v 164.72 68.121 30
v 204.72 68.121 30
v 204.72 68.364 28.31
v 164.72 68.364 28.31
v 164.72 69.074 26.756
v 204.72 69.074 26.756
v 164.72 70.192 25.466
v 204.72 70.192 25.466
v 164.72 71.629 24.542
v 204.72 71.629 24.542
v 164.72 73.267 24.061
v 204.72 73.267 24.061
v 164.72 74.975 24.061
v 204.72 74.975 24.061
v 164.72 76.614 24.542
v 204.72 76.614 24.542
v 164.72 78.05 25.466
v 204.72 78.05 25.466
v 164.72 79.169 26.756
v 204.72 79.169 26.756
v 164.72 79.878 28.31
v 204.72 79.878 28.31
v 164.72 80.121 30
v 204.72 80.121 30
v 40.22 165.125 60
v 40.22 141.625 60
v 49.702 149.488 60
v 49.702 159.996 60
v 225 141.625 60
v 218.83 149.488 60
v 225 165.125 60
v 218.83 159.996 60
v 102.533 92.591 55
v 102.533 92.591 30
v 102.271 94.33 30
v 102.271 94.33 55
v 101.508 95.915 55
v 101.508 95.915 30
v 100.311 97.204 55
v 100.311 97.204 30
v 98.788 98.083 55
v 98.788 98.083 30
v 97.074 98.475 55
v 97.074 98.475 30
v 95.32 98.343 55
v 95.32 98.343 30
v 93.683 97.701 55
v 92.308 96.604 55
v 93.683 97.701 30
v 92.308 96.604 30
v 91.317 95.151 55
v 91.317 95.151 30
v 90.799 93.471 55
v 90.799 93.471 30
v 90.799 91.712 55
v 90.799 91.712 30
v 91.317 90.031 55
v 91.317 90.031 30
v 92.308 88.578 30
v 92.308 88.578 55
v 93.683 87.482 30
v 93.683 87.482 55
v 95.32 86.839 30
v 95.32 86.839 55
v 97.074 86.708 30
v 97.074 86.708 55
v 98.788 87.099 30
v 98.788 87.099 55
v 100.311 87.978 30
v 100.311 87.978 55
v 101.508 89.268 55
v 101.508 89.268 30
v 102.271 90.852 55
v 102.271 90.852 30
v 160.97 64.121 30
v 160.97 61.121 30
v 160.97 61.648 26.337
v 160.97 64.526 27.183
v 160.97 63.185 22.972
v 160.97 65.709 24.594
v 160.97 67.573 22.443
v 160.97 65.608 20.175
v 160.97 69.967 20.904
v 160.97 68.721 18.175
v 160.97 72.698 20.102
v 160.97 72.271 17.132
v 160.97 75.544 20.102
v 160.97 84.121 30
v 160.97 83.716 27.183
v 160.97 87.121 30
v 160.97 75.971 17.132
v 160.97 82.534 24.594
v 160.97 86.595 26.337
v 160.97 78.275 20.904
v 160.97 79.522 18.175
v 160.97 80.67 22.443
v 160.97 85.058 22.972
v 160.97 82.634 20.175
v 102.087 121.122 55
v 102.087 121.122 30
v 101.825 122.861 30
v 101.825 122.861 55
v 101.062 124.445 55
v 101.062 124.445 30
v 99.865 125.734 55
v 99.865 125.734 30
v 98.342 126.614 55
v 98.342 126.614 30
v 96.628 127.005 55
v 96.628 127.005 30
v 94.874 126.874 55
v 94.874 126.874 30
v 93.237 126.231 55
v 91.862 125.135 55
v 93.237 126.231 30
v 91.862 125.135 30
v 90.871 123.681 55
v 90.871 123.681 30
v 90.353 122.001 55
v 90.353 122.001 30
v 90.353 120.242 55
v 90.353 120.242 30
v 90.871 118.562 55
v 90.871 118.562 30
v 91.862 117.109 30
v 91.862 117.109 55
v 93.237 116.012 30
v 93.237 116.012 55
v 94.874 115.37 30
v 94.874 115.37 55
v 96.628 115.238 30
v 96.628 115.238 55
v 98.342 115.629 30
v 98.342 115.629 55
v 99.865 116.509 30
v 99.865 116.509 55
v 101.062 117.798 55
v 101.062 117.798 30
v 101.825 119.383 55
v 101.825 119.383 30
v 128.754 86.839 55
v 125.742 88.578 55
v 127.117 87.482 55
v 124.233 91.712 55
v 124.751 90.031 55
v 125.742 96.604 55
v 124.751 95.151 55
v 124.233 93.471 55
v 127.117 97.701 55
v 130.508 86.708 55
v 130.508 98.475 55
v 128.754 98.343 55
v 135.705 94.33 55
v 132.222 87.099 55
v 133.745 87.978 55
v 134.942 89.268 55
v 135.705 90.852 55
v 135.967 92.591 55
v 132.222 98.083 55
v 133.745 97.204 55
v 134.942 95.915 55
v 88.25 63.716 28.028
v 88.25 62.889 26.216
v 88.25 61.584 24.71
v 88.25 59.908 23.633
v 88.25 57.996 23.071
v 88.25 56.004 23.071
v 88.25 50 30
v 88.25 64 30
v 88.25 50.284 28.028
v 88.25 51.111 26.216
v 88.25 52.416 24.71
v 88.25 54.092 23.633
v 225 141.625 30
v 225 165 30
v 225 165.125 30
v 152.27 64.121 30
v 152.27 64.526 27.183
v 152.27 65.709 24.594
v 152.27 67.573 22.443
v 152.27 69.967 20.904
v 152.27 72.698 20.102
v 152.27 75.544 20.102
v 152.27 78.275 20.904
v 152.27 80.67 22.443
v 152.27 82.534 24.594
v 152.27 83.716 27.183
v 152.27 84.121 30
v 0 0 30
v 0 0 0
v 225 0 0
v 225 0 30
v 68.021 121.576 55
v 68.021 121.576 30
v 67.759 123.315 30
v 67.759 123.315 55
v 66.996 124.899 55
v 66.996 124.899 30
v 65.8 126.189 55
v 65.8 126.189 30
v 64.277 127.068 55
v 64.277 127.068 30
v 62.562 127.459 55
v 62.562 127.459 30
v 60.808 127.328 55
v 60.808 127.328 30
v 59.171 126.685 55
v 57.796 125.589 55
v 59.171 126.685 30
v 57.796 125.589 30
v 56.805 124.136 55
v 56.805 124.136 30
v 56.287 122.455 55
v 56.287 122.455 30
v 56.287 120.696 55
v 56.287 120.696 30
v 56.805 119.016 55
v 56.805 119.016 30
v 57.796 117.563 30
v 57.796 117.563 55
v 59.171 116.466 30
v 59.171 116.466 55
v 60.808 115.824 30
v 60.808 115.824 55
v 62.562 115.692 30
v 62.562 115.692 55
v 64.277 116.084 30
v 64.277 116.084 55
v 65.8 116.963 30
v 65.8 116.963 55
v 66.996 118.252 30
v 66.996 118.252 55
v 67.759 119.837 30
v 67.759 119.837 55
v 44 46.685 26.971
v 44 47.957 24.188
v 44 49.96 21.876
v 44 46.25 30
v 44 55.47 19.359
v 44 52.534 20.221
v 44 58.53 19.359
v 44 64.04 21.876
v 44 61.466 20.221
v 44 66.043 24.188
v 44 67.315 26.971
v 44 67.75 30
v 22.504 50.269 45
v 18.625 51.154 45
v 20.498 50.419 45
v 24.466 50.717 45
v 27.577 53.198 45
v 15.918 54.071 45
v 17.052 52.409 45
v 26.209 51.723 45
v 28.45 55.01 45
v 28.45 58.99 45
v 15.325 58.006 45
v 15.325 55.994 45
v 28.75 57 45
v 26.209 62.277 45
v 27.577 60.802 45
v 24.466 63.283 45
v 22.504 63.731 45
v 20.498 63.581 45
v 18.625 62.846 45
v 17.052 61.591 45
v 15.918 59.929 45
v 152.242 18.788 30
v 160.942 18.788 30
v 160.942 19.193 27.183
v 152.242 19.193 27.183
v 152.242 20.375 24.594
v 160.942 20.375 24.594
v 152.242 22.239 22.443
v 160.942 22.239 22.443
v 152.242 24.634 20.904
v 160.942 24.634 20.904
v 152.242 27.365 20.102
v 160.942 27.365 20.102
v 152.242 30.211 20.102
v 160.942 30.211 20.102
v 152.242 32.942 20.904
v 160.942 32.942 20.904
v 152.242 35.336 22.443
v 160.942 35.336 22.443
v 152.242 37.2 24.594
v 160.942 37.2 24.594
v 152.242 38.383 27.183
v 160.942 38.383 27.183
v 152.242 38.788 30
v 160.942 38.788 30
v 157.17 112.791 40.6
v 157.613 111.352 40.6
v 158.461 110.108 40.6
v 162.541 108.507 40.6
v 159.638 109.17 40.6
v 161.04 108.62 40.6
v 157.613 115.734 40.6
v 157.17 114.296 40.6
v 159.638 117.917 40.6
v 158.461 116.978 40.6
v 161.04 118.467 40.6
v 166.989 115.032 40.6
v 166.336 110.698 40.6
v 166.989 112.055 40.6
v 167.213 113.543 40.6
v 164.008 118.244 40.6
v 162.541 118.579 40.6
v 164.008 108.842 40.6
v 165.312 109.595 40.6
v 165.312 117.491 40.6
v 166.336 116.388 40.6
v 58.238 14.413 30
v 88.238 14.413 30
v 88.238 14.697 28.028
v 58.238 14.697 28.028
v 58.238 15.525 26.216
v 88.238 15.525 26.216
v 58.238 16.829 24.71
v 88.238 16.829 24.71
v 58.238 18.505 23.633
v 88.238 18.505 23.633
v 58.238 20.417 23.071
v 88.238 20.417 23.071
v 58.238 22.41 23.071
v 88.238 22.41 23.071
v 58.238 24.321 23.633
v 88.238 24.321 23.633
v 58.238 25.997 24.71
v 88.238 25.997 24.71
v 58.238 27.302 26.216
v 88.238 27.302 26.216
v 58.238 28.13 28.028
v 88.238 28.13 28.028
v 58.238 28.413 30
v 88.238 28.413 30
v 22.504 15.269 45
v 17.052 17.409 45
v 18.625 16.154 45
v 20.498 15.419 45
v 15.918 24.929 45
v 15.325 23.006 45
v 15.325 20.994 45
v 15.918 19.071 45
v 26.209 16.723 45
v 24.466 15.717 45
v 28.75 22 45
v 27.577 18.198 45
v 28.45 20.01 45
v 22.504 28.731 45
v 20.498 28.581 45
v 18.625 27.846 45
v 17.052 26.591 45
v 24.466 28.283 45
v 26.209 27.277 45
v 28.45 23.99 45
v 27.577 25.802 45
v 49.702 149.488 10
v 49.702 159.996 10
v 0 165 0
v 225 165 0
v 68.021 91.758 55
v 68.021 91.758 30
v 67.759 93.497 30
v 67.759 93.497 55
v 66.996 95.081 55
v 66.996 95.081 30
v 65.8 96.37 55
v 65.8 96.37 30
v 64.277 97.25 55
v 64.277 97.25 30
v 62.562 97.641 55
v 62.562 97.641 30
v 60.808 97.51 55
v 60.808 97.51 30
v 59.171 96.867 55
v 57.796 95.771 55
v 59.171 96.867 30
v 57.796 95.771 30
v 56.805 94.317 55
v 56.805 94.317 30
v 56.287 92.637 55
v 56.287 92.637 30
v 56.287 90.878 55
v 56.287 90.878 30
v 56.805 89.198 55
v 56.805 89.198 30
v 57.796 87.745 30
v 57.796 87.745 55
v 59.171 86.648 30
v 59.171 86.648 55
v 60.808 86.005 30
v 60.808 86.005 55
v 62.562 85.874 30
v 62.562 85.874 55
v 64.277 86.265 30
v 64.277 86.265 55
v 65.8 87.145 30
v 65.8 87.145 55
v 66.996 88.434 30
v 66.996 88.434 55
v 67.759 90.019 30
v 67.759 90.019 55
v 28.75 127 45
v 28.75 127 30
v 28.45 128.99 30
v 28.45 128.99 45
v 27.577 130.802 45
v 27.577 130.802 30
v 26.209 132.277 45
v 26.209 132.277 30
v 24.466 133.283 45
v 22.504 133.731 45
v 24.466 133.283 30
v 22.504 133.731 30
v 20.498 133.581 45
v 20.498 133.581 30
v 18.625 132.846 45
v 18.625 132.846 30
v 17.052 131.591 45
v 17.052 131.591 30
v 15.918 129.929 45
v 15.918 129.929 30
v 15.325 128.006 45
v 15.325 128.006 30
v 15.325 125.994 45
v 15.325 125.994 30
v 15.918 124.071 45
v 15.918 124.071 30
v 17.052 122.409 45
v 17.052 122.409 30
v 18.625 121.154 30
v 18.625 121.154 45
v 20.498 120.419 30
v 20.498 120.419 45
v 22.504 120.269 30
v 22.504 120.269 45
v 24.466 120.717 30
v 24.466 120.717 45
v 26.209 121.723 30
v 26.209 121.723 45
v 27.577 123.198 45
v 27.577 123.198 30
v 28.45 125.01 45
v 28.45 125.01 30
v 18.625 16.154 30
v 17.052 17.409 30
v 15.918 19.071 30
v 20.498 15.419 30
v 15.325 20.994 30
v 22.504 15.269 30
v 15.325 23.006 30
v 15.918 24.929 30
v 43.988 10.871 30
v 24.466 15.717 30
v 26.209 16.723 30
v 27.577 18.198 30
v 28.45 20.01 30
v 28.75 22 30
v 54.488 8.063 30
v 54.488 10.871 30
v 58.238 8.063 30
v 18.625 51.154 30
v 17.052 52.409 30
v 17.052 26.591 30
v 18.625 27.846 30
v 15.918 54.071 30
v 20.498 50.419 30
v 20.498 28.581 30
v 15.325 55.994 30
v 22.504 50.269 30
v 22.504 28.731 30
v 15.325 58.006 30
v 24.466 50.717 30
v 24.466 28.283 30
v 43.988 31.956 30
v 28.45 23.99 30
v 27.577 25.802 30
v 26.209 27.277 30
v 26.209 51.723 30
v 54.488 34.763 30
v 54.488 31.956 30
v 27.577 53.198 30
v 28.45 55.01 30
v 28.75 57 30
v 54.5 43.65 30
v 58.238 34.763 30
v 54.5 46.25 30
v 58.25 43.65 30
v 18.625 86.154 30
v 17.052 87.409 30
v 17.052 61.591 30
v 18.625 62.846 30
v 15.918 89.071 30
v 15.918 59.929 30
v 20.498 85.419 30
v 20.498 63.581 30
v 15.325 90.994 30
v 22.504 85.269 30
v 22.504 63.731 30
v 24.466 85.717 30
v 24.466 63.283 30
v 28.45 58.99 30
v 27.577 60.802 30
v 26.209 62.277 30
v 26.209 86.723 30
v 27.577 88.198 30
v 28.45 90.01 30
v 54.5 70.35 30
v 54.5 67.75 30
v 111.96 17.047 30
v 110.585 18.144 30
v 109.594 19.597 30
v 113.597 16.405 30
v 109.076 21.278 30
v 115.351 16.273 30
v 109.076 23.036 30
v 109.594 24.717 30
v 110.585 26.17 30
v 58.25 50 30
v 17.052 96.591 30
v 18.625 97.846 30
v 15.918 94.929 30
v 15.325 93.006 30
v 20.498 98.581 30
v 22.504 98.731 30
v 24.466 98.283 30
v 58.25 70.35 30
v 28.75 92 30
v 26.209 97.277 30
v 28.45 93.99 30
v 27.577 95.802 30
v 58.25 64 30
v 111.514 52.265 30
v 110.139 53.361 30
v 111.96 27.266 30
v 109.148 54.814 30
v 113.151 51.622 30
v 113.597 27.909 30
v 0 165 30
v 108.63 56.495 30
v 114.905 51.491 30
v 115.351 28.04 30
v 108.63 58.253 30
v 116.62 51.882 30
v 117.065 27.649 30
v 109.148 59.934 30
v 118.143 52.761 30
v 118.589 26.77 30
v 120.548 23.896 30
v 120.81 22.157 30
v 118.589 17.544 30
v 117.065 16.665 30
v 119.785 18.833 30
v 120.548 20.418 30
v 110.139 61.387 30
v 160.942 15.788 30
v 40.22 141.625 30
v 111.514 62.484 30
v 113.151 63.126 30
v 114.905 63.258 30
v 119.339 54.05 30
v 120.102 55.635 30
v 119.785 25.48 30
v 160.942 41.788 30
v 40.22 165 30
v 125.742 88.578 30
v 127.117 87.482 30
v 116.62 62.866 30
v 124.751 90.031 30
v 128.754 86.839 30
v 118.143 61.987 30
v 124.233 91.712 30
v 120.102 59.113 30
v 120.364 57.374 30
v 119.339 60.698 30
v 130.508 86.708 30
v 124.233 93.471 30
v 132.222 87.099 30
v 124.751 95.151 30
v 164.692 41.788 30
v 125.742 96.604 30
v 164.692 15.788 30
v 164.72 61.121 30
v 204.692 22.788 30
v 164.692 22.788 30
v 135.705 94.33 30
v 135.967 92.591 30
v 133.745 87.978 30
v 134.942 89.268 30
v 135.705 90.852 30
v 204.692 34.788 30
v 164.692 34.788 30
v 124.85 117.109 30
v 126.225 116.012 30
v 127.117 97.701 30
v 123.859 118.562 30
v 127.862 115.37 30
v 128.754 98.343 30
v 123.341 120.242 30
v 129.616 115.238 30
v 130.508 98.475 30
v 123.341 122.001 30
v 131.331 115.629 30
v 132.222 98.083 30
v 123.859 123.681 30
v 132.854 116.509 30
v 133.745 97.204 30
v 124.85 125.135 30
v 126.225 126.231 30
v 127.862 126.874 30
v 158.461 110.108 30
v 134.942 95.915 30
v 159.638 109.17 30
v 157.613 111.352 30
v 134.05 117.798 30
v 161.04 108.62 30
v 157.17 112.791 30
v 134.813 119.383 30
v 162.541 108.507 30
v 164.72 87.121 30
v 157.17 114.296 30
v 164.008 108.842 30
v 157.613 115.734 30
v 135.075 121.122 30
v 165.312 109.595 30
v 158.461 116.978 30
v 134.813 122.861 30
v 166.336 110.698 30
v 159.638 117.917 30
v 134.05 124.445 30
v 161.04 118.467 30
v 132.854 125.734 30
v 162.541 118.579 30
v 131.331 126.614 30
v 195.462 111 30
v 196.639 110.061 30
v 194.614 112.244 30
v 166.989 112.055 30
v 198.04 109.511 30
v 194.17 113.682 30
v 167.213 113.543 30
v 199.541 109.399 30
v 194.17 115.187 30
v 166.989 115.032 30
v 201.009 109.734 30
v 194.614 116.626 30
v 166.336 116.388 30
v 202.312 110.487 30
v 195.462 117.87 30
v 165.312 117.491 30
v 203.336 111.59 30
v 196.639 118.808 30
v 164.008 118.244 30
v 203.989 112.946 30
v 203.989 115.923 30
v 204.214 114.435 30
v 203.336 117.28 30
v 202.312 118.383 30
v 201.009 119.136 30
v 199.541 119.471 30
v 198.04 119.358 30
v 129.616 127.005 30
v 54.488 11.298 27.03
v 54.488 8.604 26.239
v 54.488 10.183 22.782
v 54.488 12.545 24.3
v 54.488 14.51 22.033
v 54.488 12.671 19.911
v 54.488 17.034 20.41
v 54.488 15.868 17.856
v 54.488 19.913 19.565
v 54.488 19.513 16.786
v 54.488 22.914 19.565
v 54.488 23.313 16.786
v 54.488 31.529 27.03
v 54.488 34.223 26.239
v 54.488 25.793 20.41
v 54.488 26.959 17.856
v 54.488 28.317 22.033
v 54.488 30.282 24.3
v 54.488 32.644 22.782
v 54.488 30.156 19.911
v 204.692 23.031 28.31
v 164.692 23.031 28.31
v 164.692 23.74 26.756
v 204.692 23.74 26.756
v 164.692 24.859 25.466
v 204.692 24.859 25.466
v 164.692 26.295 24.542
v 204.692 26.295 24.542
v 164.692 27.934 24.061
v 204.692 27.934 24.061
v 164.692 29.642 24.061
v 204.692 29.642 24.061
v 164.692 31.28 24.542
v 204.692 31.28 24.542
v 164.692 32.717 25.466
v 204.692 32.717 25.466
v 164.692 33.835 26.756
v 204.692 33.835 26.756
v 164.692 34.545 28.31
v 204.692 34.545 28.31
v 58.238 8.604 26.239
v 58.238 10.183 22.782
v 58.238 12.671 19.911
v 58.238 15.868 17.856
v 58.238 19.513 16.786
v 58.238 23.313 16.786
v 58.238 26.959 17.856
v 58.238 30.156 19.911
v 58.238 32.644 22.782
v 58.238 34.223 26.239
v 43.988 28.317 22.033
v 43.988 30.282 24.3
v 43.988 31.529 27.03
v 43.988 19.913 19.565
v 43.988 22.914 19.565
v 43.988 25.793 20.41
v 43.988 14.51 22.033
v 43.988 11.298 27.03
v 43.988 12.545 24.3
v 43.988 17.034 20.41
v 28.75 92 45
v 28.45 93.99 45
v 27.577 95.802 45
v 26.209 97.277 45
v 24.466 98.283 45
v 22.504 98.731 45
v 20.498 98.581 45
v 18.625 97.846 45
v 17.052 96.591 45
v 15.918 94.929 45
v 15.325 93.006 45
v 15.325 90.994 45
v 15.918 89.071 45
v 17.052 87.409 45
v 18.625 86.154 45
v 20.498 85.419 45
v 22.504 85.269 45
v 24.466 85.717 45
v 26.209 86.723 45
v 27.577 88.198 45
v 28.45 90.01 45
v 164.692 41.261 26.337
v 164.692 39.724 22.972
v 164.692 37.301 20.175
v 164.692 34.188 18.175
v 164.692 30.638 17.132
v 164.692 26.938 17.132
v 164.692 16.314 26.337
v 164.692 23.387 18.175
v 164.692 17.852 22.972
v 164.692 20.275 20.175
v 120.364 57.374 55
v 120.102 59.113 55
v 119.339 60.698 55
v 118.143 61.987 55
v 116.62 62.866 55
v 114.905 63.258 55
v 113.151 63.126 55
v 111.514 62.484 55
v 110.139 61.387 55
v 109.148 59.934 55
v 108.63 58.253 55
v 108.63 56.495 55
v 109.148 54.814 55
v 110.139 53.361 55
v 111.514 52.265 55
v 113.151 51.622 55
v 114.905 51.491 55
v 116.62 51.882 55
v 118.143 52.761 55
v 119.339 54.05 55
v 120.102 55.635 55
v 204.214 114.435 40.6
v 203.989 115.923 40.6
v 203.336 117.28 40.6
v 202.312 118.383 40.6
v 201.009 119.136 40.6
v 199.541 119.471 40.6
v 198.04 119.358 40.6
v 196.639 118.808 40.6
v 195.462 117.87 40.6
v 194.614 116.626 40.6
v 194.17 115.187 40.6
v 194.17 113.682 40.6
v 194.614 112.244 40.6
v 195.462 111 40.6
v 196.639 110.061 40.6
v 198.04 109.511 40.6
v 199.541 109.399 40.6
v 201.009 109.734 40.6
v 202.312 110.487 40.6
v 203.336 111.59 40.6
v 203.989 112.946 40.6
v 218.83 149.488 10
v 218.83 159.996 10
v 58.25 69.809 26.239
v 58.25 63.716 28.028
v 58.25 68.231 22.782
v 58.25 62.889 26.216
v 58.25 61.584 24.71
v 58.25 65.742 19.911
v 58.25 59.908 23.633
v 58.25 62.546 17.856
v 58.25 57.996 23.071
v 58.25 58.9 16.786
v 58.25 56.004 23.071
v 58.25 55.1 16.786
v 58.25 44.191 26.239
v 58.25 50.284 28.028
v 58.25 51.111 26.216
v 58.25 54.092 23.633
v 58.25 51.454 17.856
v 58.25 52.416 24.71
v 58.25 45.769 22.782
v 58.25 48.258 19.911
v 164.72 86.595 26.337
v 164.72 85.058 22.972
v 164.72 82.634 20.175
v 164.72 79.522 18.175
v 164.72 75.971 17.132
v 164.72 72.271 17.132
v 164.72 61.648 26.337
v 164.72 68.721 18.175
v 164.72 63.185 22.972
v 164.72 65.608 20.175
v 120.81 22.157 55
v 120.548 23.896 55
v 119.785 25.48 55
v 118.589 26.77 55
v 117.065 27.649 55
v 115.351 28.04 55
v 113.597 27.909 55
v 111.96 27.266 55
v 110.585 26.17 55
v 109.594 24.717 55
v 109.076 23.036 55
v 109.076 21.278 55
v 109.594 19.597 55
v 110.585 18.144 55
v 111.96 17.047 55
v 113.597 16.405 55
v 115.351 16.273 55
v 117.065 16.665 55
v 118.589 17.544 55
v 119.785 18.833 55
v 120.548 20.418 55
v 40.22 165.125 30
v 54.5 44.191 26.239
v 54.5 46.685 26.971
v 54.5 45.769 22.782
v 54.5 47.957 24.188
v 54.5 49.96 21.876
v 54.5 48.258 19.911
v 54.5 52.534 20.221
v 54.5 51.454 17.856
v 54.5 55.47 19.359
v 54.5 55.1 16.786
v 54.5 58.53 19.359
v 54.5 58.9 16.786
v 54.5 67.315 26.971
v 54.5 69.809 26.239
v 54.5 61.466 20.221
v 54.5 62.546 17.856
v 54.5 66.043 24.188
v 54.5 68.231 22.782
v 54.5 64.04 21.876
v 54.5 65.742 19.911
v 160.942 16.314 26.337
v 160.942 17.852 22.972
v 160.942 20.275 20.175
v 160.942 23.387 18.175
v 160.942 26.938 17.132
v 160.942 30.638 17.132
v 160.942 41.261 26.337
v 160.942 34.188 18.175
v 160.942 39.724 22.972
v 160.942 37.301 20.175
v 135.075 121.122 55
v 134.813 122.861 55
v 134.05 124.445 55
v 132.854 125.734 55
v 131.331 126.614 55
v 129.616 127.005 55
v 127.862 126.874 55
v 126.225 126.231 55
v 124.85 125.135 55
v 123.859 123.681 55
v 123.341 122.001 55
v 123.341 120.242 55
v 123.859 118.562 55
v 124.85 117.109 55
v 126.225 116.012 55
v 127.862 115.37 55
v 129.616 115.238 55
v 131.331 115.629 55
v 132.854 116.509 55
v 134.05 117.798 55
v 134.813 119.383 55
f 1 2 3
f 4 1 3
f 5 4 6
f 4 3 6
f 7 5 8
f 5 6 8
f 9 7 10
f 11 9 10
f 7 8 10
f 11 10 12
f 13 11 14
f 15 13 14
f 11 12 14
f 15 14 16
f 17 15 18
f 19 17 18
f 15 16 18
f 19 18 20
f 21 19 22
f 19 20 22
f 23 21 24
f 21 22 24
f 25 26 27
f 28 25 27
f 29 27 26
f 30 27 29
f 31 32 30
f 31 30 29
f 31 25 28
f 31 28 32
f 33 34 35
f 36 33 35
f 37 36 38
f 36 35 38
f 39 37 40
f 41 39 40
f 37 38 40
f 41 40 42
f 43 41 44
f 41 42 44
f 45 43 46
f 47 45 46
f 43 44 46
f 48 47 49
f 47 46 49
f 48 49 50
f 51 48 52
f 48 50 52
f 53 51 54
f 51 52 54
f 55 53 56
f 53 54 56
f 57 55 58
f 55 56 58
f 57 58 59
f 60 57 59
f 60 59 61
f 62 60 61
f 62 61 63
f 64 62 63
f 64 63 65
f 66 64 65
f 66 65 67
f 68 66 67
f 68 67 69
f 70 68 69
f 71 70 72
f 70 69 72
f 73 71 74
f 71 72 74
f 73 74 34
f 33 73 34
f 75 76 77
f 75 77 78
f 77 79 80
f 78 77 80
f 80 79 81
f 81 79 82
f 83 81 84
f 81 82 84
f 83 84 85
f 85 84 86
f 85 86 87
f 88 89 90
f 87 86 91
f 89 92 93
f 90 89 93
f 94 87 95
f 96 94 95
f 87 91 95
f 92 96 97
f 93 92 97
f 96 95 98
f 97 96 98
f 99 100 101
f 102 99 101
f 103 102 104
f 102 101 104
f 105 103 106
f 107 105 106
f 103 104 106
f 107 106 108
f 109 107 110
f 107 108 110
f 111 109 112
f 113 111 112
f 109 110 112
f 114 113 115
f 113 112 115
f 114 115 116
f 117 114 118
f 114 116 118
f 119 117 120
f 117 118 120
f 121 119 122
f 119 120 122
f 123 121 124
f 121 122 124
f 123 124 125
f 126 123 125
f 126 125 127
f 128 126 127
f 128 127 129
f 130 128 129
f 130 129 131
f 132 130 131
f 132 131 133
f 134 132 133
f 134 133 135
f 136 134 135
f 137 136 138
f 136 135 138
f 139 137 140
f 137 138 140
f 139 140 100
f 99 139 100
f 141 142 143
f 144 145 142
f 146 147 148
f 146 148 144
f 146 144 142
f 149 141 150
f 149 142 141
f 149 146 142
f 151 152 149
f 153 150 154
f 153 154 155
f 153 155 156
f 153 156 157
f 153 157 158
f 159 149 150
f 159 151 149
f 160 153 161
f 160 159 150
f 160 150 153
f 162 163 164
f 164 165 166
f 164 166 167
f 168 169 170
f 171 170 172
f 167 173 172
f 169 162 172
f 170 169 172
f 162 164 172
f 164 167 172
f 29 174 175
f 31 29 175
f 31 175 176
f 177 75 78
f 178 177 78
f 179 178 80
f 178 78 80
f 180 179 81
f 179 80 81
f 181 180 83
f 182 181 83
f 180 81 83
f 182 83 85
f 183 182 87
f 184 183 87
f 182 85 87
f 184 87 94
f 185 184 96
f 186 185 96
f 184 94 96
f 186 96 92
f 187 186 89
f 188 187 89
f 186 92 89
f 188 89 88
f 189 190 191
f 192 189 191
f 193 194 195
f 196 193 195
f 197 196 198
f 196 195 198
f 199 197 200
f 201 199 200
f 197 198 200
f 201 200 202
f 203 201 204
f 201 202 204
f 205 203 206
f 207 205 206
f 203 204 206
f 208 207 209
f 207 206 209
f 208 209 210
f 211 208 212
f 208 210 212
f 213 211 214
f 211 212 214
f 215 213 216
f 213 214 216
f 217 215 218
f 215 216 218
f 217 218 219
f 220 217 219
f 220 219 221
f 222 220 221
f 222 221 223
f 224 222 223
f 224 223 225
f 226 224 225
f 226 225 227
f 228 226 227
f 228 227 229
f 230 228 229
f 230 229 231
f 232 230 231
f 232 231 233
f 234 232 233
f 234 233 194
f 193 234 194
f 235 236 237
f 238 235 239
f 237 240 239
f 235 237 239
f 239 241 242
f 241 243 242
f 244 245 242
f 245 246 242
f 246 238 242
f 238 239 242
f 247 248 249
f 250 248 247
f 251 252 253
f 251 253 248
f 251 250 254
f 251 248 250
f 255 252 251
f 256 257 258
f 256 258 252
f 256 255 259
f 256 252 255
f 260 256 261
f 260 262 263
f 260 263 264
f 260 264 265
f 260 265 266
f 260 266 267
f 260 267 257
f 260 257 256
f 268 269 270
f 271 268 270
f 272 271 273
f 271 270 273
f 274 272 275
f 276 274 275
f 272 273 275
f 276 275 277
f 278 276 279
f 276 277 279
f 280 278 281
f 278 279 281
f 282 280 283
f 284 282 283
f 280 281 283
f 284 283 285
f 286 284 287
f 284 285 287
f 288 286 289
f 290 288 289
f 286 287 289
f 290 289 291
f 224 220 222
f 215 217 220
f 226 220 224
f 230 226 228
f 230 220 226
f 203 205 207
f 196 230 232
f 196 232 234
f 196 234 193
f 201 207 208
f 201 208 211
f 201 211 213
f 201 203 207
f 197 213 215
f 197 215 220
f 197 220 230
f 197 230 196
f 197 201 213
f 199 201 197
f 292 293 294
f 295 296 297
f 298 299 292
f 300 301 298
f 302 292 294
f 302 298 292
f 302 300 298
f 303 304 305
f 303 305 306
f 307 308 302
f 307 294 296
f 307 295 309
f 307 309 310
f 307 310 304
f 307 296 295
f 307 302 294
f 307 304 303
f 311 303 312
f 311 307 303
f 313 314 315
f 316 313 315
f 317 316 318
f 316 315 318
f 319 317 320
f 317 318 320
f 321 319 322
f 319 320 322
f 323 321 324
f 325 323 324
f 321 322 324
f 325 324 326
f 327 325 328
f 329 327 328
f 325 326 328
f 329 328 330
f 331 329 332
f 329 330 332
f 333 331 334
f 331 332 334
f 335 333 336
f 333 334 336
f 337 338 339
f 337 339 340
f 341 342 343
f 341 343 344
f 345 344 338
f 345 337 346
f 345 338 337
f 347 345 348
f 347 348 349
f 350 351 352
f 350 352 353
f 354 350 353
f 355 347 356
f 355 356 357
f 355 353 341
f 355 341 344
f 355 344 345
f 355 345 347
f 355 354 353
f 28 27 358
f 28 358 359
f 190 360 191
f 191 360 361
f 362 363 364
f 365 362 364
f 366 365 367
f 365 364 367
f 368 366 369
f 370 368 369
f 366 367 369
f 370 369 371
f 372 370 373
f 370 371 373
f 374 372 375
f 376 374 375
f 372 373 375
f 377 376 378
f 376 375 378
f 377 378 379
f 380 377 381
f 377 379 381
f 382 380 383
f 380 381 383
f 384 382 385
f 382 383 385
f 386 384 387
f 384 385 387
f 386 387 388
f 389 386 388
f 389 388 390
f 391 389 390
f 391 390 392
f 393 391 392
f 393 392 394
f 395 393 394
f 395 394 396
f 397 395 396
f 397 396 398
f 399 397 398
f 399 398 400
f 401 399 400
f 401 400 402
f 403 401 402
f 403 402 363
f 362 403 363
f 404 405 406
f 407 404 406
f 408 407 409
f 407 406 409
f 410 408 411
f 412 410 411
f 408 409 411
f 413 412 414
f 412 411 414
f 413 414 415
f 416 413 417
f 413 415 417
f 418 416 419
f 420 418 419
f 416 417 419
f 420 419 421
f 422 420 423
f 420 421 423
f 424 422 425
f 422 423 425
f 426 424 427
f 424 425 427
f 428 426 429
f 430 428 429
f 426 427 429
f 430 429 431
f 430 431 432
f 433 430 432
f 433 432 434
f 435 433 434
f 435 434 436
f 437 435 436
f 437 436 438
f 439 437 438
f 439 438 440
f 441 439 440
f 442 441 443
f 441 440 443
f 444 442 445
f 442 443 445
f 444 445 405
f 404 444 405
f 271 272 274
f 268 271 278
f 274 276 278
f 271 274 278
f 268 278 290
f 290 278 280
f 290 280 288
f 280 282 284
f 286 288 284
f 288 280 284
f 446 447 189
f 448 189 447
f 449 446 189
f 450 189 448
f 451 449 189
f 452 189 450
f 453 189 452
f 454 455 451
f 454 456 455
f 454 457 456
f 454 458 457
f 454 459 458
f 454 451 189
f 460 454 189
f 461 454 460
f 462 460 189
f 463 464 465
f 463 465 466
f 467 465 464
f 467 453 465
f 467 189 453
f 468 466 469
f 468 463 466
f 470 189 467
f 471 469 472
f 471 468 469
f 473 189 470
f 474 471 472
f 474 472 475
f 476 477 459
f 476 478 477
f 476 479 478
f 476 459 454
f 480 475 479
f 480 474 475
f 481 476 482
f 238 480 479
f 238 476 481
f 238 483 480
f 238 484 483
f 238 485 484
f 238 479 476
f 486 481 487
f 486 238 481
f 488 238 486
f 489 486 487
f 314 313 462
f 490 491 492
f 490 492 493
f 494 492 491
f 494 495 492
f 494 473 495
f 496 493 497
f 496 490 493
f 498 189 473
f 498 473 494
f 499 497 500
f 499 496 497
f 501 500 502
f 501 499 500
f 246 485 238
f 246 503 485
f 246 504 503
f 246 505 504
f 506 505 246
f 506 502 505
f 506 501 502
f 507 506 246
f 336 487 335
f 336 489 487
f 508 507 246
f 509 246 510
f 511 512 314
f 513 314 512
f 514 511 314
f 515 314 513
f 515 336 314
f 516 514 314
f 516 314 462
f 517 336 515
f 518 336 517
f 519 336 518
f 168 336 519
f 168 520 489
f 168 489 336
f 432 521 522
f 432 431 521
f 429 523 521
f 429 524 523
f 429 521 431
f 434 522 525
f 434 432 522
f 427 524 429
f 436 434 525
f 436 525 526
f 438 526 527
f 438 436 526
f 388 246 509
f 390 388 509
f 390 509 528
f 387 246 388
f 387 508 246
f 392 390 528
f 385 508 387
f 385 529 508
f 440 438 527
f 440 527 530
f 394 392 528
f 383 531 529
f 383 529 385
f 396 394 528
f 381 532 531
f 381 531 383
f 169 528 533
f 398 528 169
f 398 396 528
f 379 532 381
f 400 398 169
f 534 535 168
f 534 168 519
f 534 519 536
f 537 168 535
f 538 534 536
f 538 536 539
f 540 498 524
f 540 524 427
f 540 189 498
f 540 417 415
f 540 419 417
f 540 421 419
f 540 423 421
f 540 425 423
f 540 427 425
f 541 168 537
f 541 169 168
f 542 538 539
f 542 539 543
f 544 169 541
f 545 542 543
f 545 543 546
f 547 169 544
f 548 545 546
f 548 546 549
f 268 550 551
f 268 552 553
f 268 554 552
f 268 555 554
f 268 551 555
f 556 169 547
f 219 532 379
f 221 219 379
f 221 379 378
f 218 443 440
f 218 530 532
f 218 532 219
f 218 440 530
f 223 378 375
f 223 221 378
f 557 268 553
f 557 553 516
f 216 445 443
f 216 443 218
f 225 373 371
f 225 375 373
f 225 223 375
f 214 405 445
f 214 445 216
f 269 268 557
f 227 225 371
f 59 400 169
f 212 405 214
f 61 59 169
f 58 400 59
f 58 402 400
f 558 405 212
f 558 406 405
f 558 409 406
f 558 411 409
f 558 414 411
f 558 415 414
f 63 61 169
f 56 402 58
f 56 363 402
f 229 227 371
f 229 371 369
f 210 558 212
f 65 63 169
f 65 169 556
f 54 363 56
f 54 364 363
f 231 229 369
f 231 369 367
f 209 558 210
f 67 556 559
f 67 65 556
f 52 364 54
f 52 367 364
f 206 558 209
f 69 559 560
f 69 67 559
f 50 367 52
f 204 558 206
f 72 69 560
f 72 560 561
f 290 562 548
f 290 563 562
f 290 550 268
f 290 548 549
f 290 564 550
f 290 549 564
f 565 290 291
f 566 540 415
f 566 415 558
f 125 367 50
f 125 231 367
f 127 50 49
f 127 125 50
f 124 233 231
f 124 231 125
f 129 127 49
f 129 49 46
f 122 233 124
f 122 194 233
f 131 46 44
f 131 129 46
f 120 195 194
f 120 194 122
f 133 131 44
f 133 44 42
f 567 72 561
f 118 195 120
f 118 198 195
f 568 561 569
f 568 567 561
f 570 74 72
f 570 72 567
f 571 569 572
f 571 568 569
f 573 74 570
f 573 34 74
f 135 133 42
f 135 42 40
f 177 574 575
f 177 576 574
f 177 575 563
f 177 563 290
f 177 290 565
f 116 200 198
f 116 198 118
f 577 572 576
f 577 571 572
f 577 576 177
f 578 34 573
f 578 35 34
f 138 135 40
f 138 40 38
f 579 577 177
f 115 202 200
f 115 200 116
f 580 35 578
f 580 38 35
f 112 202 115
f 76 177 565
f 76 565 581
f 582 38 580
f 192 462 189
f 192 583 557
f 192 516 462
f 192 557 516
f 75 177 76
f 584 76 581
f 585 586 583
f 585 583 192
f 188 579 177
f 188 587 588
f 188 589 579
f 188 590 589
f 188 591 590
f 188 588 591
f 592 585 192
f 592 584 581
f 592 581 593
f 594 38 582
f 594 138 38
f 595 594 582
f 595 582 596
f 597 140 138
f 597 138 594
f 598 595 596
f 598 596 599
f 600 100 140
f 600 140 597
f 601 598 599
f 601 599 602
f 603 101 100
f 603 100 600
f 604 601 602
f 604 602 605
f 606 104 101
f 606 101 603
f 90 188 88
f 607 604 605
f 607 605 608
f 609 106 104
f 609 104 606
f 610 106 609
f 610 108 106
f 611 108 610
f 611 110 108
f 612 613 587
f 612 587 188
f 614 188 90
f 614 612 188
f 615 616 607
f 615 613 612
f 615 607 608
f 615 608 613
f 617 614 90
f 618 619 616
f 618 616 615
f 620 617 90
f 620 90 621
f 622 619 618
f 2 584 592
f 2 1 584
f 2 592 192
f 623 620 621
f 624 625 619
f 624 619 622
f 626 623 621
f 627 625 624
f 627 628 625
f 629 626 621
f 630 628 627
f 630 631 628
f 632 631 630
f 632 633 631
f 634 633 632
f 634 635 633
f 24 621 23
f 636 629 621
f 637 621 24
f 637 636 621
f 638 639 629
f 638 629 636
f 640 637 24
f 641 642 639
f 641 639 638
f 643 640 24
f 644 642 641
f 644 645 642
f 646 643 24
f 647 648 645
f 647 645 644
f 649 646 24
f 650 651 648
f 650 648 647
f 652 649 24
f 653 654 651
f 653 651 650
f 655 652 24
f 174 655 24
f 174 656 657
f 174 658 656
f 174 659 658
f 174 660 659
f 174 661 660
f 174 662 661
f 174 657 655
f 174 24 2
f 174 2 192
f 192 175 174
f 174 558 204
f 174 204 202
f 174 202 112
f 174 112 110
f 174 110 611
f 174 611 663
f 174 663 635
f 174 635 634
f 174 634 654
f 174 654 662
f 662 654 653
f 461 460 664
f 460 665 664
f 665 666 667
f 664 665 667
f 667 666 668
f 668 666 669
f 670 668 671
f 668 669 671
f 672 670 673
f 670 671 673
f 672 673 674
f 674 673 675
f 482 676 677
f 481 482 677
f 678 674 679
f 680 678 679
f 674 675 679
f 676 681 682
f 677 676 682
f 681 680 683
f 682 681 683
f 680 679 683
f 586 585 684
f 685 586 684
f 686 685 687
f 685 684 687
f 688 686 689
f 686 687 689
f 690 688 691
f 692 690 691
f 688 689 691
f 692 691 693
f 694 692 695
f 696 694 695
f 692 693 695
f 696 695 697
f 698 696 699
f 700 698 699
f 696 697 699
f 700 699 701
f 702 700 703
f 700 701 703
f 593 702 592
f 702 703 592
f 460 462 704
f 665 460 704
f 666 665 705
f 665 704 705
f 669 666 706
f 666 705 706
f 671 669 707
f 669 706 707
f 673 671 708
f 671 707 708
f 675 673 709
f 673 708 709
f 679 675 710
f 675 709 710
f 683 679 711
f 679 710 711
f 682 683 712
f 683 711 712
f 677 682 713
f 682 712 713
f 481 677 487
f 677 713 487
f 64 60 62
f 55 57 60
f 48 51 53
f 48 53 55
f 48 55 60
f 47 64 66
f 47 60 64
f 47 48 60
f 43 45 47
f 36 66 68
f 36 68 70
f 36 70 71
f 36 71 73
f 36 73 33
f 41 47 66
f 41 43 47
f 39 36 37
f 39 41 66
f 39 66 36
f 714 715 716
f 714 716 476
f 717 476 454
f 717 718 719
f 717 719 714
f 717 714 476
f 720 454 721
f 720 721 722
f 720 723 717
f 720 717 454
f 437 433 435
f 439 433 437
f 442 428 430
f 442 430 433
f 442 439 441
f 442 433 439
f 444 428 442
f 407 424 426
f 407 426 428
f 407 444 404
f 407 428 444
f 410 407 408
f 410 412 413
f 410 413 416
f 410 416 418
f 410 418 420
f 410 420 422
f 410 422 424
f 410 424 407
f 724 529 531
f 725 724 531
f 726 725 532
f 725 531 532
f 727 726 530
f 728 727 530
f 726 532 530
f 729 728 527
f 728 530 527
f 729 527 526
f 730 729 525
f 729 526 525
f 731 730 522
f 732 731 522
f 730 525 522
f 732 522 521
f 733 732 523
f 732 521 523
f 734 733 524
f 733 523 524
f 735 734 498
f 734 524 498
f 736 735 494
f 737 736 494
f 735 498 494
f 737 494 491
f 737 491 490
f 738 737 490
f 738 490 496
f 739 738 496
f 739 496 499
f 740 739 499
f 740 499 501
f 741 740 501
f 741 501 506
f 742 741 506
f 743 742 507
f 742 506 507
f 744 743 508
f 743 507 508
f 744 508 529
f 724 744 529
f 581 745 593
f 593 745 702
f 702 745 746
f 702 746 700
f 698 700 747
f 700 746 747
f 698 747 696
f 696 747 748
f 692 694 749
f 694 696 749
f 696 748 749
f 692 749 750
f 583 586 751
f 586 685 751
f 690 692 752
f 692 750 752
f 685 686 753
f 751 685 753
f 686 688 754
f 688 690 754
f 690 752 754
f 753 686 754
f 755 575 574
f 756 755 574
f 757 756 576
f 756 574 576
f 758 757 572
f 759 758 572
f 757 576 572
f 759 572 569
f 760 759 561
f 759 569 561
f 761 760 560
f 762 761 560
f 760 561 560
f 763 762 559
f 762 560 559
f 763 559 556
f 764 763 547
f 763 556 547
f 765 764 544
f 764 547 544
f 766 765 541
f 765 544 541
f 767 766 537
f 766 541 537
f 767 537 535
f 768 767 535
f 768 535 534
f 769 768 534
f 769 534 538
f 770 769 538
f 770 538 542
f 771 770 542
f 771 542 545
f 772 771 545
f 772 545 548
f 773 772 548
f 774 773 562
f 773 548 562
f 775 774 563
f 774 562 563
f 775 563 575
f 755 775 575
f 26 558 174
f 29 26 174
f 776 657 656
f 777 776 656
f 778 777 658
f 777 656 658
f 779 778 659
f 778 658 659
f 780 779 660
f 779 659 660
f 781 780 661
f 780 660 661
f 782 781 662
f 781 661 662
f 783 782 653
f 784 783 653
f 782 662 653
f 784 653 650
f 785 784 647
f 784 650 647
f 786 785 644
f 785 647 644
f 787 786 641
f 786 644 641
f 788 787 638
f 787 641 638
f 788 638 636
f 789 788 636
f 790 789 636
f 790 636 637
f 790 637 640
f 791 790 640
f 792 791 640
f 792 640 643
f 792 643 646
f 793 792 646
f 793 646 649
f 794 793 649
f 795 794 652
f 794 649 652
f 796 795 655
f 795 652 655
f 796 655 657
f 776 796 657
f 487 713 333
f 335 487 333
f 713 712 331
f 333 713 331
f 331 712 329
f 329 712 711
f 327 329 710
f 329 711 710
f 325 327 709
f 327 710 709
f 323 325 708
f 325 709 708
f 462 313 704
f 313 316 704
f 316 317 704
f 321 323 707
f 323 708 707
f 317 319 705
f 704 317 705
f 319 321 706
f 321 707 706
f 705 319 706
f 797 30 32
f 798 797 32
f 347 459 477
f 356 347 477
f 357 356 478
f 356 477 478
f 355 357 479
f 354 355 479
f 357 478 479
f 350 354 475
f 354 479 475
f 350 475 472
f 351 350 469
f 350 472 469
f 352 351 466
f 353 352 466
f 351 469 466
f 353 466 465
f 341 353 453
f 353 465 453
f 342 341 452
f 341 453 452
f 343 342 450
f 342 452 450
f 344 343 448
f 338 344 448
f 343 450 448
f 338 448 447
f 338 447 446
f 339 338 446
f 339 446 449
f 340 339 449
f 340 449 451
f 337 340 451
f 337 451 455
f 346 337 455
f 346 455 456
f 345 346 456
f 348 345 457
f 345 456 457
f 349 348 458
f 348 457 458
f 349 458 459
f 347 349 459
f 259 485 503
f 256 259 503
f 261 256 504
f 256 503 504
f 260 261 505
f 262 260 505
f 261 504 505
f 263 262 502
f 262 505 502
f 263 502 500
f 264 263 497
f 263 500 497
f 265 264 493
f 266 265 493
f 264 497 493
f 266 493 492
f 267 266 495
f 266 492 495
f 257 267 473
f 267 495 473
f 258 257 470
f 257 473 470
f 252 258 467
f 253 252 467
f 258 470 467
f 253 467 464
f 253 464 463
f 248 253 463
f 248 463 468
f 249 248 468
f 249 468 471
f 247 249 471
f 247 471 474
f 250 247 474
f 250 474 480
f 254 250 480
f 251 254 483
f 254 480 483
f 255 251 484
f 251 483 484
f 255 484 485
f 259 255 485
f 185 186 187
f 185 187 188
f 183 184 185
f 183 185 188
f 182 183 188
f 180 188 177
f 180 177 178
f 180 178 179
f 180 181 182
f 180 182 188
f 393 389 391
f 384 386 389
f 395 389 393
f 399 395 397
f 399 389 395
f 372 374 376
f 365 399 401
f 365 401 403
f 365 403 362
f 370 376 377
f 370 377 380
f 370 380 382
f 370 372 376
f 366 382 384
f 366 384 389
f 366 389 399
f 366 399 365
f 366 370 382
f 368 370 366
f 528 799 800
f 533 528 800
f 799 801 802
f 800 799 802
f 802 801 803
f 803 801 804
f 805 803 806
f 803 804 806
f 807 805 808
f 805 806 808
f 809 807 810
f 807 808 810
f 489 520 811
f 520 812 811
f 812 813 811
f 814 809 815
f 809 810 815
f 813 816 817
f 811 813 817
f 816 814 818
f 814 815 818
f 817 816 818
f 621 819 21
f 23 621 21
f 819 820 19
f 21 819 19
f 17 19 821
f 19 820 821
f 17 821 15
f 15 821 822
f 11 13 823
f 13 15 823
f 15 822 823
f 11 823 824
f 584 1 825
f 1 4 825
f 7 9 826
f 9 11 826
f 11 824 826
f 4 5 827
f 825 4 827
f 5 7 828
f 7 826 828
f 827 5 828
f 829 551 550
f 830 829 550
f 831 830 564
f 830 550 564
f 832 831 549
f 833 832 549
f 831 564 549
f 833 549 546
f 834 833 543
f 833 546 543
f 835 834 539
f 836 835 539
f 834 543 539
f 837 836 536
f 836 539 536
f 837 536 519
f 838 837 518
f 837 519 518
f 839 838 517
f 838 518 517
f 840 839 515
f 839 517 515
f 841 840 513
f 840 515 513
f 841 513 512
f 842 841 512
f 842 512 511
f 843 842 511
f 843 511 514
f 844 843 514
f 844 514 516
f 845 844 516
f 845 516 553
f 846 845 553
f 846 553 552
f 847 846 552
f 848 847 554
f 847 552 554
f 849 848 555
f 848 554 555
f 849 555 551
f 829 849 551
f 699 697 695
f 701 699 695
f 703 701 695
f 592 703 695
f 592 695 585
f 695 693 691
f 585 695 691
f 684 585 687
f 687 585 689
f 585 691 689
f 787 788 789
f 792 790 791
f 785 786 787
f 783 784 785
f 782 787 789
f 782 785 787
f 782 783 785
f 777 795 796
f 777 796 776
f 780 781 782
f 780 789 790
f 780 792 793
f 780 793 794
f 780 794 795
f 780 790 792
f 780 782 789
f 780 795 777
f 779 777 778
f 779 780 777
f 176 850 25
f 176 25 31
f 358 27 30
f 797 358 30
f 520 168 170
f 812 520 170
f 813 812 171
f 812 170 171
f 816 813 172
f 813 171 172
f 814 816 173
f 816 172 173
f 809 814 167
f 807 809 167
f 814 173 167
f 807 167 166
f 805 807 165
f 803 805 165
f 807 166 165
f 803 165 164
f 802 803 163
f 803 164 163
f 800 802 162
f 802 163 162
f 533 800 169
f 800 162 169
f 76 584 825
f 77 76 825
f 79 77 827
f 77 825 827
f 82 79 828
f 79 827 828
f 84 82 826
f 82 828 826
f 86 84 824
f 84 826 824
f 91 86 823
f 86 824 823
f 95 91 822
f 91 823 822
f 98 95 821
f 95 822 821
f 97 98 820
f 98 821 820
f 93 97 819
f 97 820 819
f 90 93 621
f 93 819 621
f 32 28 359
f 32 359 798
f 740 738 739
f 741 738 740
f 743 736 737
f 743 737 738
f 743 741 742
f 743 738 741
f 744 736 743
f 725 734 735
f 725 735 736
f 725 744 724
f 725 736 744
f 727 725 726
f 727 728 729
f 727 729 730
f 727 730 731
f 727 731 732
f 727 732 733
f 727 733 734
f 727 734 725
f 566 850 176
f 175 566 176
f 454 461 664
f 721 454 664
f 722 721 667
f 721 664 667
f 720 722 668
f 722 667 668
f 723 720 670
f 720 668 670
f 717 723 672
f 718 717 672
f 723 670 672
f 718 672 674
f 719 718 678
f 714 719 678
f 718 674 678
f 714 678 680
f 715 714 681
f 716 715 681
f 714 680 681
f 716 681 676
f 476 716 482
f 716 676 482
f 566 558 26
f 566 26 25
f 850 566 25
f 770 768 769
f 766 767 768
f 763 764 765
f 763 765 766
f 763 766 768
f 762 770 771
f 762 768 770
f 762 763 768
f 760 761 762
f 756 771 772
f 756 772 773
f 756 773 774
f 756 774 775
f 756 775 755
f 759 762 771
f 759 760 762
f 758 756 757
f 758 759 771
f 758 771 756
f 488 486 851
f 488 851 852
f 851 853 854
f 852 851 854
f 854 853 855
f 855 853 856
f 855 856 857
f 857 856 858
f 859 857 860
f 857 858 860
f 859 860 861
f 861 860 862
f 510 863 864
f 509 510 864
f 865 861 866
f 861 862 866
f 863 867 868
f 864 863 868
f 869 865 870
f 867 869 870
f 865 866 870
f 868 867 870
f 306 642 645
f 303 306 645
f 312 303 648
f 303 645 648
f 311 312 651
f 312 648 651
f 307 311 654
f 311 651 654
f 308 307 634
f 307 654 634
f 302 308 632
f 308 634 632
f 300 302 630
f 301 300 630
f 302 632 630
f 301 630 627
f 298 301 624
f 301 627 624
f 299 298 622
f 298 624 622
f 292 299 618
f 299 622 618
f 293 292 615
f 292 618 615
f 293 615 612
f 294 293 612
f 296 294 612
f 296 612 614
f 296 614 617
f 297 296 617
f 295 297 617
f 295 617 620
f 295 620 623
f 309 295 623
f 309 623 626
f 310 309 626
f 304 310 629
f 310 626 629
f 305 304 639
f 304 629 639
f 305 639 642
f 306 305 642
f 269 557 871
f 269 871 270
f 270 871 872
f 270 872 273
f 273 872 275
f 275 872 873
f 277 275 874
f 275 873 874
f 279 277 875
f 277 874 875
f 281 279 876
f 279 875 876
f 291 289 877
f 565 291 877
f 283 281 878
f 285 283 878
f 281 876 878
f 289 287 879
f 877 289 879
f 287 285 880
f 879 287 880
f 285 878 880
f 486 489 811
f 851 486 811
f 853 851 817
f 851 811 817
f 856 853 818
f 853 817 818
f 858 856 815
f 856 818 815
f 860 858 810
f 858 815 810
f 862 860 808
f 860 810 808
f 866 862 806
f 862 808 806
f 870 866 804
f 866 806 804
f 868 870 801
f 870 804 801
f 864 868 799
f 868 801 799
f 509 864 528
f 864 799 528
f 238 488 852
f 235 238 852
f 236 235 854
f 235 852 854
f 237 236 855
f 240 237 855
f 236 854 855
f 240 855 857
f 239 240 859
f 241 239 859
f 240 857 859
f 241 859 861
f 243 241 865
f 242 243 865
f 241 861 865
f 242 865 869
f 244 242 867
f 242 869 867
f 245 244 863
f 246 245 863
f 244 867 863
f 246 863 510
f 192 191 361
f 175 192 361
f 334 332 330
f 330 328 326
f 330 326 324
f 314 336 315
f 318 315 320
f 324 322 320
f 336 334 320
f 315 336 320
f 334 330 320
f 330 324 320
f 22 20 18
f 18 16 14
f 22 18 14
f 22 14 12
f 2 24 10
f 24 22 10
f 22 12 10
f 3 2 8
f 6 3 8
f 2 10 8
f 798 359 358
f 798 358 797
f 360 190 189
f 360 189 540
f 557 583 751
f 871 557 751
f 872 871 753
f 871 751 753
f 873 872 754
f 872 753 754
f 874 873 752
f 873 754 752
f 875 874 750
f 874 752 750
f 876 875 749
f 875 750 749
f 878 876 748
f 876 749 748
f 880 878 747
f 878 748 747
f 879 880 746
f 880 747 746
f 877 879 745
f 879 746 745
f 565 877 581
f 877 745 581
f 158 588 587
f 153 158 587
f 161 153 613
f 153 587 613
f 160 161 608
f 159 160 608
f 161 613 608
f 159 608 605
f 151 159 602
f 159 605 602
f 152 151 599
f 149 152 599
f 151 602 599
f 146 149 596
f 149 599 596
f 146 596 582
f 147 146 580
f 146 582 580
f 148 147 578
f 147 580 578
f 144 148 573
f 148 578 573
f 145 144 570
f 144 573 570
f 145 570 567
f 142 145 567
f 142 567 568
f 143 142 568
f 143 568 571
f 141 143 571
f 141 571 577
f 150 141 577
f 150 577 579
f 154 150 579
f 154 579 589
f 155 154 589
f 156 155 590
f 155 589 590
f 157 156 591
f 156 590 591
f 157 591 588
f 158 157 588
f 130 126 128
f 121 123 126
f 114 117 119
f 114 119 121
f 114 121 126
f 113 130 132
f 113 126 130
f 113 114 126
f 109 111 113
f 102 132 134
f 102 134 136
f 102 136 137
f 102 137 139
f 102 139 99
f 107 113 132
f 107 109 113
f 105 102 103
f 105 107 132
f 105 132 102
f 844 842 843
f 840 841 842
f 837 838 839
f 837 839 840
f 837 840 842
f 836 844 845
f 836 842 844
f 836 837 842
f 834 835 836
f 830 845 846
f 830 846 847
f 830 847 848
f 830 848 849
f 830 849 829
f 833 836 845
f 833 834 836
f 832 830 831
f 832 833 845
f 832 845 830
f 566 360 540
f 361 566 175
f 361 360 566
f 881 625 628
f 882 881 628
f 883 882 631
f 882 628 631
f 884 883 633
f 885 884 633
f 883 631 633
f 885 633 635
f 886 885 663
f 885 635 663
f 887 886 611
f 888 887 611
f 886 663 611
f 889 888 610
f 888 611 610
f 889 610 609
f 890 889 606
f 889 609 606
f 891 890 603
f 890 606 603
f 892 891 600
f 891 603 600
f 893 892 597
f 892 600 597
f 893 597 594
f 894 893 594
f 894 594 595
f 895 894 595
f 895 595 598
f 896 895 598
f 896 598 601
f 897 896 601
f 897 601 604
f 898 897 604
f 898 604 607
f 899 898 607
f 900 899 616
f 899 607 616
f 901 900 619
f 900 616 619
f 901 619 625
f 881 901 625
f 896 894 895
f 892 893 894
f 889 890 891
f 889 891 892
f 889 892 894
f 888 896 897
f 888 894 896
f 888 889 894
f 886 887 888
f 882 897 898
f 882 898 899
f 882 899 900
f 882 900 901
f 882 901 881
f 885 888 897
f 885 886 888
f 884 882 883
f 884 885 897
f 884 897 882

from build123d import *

# Parameters (mm, degrees)
F0_W      = 225
F0_H      = 165
F1_DEPTH  = 30
F2_R      = 6.75
F3_DEPTH  = 15
F5_W      = 0.0118811131
F5_H      = 10.5422940105
F5_W_2    = 10.4881188869
F5_W_3    = 30
F5_H_2    = 7
F10_R     = 5.9
F11_DEPTH = 12.85
F12_DEPTH = 25
F15_W     = 8.7
F15_H     = 10
F15_W_2   = 40
F15_H_2   = 6
F17_R     = 5.05
F18_DEPTH = 10.6
F19_W     = 184.7800500691
F19_H     = 23.5
F20_DEPTH = 30
F21_W     = 169.1280193627
F21_H     = 10.5079561472
F22_DEPTH = 50


# Not quite as in the source:
# - a feature names something its author has since deleted; it is built from what else it names


with BuildPart() as f1:
    # F0 (on Top) → F1 (new body)
    with BuildSketch(Plane.XY):
        with Locations((112.5, 82.5)):
            Rectangle(F0_W, F0_H)
    extrude(amount=F1_DEPTH)

    # F2 (on face) → F3 (join)
    with BuildSketch(Plane.XY.offset(30)):
        with Locations((22, 127)):
            Circle(F2_R)
        with Locations((22, 92)):
            Circle(F2_R)
        with Locations((22, 57)):
            Circle(F2_R)
        with Locations((22, 22)):
            Circle(F2_R)
    extrude(amount=F3_DEPTH)

    # F5 (on face) → F6 (revolve, cut)
    with BuildSketch(Plane.XY.offset(30)):
        with Locations((43.9940594435, 16.1421531811)):
            Rectangle(F5_W, F5_H)
        with Locations((49.2440594435, 16.1421531811)):
            Rectangle(F5_W_2, F5_H)
        Polygon((58.2381188869, 21.4133001864), (54.4881188869, 21.4133001864), (54.4881188869, 10.8710061759), (54.4881188869, 8.0633001864), (58.2381188869, 8.0633001864), (58.2381188869, 14.4133001864), align=None)
        with Locations((73.2381188869, 17.9133001864)):
            Rectangle(F5_W_3, F5_H_2)
    revolve(axis=Axis((49.2381188869, 21.4133001864, 30), (1, 0, 0)), mode=Mode.SUBTRACT)

    # F7 (on face) → F8 (revolve, cut)
    with BuildSketch(Plane.XY.offset(30)):
        Polygon((44, 57), (44, 46.25), (54.5, 46.25), (54.5, 43.65), (58.25, 43.65), (58.25, 50), (88.25, 50), (88.25, 57), (58.25, 57), (54.5, 57), align=None)
    revolve(axis=Axis((49.25, 57, 30), (1, 0, 0)), mode=Mode.SUBTRACT)

    # F10 (on face) → F11 (join)
    with BuildSketch(Plane.XY.offset(30)):
        with Locations((62.1212087572, 121.5757578611)):
            Circle(F10_R)
        with Locations((62.1212087572, 91.7575731874)):
            Circle(F10_R)
    extrude(amount=F11_DEPTH)

    # F10 (on face) → F12 (join)
    with BuildSketch(Plane.XY.offset(30)):
        with Locations((62.1212087572, 121.5757578611)):
            Circle(F10_R)
        with Locations((62.1212087572, 91.7575731874)):
            Circle(F10_R)
        with Locations((96.6326966882, 92.5912261009)):
            Circle(F10_R)
        with Locations((96.1869060993, 121.1215853691)):
            Circle(F10_R)
        with Locations((114.9099543691, 22.1569109708)):
            Circle(F10_R)
        with Locations((129.1751265526, 121.1215853691)):
            Circle(F10_R)
        with Locations((130.0667077303, 92.5912261009)):
            Circle(F10_R)
        with Locations((114.4641637802, 57.3740676045)):
            Circle(F10_R)
    extrude(amount=F12_DEPTH)

    # F13 (on face) → F14 (revolve, cut)
    with BuildSketch(Plane.XY.offset(30)):
        Polygon((160.9424221039, 28.7878794968), (152.2424221039, 28.7878794968), (152.2424221039, 18.7878794968), (160.9424221039, 18.7878794968), (160.9424221039, 15.7878794968), (164.6924221039, 15.7878794968), (164.6924221039, 22.7878794968), (204.6924221039, 22.7878794968), (204.6924221039, 28.7878794968), (164.6924221039, 28.7878794968), align=None)
    revolve(axis=Axis((184.6924221039, 28.7878794968, 30), (1, 0, 0)), mode=Mode.SUBTRACT)

    # F15 (on face) → F16 (revolve, cut)
    with BuildSketch(Plane.XY.offset(30)):
        with Locations((156.6197043896, 69.1212128103)):
            Rectangle(F15_W, F15_H)
        Polygon((164.7197043896, 74.1212128103), (160.9697043896, 74.1212128103), (160.9697043896, 64.1212128103), (160.9697043896, 61.1212128103), (164.7197043896, 61.1212128103), (164.7197043896, 68.1212128103), align=None)
        with Locations((184.7197043896, 71.1212128103)):
            Rectangle(F15_W_2, F15_H_2)
    revolve(axis=Axis((184.7197043896, 74.1212128103, 30), (1, 0, 0)), mode=Mode.SUBTRACT)

    # F17 (on face) → F18 (join)
    with BuildSketch(Plane.XY.offset(30)):
        with Locations((162.1633470058, 113.5432049632)):
            Circle(F17_R)
        with Locations((199.1636604071, 114.4347786903)):
            Circle(F17_R)
    extrude(amount=F18_DEPTH)

    # F19 (on face) → F20 (join)
    with BuildSketch(Plane.XY.offset(30)):
        with Locations((132.609969005, 153.3750020266)):
            Rectangle(F19_W, F19_H)
    extrude(amount=F20_DEPTH)

    # F21 (on face) → F22 (cut)
    with BuildSketch(Plane.XY.offset(60)):
        with Locations((134.2664714903, 154.7421440482)):
            Rectangle(F21_W, F21_H)
    extrude(amount=-F22_DEPTH, mode=Mode.SUBTRACT)


solid = f1.part
